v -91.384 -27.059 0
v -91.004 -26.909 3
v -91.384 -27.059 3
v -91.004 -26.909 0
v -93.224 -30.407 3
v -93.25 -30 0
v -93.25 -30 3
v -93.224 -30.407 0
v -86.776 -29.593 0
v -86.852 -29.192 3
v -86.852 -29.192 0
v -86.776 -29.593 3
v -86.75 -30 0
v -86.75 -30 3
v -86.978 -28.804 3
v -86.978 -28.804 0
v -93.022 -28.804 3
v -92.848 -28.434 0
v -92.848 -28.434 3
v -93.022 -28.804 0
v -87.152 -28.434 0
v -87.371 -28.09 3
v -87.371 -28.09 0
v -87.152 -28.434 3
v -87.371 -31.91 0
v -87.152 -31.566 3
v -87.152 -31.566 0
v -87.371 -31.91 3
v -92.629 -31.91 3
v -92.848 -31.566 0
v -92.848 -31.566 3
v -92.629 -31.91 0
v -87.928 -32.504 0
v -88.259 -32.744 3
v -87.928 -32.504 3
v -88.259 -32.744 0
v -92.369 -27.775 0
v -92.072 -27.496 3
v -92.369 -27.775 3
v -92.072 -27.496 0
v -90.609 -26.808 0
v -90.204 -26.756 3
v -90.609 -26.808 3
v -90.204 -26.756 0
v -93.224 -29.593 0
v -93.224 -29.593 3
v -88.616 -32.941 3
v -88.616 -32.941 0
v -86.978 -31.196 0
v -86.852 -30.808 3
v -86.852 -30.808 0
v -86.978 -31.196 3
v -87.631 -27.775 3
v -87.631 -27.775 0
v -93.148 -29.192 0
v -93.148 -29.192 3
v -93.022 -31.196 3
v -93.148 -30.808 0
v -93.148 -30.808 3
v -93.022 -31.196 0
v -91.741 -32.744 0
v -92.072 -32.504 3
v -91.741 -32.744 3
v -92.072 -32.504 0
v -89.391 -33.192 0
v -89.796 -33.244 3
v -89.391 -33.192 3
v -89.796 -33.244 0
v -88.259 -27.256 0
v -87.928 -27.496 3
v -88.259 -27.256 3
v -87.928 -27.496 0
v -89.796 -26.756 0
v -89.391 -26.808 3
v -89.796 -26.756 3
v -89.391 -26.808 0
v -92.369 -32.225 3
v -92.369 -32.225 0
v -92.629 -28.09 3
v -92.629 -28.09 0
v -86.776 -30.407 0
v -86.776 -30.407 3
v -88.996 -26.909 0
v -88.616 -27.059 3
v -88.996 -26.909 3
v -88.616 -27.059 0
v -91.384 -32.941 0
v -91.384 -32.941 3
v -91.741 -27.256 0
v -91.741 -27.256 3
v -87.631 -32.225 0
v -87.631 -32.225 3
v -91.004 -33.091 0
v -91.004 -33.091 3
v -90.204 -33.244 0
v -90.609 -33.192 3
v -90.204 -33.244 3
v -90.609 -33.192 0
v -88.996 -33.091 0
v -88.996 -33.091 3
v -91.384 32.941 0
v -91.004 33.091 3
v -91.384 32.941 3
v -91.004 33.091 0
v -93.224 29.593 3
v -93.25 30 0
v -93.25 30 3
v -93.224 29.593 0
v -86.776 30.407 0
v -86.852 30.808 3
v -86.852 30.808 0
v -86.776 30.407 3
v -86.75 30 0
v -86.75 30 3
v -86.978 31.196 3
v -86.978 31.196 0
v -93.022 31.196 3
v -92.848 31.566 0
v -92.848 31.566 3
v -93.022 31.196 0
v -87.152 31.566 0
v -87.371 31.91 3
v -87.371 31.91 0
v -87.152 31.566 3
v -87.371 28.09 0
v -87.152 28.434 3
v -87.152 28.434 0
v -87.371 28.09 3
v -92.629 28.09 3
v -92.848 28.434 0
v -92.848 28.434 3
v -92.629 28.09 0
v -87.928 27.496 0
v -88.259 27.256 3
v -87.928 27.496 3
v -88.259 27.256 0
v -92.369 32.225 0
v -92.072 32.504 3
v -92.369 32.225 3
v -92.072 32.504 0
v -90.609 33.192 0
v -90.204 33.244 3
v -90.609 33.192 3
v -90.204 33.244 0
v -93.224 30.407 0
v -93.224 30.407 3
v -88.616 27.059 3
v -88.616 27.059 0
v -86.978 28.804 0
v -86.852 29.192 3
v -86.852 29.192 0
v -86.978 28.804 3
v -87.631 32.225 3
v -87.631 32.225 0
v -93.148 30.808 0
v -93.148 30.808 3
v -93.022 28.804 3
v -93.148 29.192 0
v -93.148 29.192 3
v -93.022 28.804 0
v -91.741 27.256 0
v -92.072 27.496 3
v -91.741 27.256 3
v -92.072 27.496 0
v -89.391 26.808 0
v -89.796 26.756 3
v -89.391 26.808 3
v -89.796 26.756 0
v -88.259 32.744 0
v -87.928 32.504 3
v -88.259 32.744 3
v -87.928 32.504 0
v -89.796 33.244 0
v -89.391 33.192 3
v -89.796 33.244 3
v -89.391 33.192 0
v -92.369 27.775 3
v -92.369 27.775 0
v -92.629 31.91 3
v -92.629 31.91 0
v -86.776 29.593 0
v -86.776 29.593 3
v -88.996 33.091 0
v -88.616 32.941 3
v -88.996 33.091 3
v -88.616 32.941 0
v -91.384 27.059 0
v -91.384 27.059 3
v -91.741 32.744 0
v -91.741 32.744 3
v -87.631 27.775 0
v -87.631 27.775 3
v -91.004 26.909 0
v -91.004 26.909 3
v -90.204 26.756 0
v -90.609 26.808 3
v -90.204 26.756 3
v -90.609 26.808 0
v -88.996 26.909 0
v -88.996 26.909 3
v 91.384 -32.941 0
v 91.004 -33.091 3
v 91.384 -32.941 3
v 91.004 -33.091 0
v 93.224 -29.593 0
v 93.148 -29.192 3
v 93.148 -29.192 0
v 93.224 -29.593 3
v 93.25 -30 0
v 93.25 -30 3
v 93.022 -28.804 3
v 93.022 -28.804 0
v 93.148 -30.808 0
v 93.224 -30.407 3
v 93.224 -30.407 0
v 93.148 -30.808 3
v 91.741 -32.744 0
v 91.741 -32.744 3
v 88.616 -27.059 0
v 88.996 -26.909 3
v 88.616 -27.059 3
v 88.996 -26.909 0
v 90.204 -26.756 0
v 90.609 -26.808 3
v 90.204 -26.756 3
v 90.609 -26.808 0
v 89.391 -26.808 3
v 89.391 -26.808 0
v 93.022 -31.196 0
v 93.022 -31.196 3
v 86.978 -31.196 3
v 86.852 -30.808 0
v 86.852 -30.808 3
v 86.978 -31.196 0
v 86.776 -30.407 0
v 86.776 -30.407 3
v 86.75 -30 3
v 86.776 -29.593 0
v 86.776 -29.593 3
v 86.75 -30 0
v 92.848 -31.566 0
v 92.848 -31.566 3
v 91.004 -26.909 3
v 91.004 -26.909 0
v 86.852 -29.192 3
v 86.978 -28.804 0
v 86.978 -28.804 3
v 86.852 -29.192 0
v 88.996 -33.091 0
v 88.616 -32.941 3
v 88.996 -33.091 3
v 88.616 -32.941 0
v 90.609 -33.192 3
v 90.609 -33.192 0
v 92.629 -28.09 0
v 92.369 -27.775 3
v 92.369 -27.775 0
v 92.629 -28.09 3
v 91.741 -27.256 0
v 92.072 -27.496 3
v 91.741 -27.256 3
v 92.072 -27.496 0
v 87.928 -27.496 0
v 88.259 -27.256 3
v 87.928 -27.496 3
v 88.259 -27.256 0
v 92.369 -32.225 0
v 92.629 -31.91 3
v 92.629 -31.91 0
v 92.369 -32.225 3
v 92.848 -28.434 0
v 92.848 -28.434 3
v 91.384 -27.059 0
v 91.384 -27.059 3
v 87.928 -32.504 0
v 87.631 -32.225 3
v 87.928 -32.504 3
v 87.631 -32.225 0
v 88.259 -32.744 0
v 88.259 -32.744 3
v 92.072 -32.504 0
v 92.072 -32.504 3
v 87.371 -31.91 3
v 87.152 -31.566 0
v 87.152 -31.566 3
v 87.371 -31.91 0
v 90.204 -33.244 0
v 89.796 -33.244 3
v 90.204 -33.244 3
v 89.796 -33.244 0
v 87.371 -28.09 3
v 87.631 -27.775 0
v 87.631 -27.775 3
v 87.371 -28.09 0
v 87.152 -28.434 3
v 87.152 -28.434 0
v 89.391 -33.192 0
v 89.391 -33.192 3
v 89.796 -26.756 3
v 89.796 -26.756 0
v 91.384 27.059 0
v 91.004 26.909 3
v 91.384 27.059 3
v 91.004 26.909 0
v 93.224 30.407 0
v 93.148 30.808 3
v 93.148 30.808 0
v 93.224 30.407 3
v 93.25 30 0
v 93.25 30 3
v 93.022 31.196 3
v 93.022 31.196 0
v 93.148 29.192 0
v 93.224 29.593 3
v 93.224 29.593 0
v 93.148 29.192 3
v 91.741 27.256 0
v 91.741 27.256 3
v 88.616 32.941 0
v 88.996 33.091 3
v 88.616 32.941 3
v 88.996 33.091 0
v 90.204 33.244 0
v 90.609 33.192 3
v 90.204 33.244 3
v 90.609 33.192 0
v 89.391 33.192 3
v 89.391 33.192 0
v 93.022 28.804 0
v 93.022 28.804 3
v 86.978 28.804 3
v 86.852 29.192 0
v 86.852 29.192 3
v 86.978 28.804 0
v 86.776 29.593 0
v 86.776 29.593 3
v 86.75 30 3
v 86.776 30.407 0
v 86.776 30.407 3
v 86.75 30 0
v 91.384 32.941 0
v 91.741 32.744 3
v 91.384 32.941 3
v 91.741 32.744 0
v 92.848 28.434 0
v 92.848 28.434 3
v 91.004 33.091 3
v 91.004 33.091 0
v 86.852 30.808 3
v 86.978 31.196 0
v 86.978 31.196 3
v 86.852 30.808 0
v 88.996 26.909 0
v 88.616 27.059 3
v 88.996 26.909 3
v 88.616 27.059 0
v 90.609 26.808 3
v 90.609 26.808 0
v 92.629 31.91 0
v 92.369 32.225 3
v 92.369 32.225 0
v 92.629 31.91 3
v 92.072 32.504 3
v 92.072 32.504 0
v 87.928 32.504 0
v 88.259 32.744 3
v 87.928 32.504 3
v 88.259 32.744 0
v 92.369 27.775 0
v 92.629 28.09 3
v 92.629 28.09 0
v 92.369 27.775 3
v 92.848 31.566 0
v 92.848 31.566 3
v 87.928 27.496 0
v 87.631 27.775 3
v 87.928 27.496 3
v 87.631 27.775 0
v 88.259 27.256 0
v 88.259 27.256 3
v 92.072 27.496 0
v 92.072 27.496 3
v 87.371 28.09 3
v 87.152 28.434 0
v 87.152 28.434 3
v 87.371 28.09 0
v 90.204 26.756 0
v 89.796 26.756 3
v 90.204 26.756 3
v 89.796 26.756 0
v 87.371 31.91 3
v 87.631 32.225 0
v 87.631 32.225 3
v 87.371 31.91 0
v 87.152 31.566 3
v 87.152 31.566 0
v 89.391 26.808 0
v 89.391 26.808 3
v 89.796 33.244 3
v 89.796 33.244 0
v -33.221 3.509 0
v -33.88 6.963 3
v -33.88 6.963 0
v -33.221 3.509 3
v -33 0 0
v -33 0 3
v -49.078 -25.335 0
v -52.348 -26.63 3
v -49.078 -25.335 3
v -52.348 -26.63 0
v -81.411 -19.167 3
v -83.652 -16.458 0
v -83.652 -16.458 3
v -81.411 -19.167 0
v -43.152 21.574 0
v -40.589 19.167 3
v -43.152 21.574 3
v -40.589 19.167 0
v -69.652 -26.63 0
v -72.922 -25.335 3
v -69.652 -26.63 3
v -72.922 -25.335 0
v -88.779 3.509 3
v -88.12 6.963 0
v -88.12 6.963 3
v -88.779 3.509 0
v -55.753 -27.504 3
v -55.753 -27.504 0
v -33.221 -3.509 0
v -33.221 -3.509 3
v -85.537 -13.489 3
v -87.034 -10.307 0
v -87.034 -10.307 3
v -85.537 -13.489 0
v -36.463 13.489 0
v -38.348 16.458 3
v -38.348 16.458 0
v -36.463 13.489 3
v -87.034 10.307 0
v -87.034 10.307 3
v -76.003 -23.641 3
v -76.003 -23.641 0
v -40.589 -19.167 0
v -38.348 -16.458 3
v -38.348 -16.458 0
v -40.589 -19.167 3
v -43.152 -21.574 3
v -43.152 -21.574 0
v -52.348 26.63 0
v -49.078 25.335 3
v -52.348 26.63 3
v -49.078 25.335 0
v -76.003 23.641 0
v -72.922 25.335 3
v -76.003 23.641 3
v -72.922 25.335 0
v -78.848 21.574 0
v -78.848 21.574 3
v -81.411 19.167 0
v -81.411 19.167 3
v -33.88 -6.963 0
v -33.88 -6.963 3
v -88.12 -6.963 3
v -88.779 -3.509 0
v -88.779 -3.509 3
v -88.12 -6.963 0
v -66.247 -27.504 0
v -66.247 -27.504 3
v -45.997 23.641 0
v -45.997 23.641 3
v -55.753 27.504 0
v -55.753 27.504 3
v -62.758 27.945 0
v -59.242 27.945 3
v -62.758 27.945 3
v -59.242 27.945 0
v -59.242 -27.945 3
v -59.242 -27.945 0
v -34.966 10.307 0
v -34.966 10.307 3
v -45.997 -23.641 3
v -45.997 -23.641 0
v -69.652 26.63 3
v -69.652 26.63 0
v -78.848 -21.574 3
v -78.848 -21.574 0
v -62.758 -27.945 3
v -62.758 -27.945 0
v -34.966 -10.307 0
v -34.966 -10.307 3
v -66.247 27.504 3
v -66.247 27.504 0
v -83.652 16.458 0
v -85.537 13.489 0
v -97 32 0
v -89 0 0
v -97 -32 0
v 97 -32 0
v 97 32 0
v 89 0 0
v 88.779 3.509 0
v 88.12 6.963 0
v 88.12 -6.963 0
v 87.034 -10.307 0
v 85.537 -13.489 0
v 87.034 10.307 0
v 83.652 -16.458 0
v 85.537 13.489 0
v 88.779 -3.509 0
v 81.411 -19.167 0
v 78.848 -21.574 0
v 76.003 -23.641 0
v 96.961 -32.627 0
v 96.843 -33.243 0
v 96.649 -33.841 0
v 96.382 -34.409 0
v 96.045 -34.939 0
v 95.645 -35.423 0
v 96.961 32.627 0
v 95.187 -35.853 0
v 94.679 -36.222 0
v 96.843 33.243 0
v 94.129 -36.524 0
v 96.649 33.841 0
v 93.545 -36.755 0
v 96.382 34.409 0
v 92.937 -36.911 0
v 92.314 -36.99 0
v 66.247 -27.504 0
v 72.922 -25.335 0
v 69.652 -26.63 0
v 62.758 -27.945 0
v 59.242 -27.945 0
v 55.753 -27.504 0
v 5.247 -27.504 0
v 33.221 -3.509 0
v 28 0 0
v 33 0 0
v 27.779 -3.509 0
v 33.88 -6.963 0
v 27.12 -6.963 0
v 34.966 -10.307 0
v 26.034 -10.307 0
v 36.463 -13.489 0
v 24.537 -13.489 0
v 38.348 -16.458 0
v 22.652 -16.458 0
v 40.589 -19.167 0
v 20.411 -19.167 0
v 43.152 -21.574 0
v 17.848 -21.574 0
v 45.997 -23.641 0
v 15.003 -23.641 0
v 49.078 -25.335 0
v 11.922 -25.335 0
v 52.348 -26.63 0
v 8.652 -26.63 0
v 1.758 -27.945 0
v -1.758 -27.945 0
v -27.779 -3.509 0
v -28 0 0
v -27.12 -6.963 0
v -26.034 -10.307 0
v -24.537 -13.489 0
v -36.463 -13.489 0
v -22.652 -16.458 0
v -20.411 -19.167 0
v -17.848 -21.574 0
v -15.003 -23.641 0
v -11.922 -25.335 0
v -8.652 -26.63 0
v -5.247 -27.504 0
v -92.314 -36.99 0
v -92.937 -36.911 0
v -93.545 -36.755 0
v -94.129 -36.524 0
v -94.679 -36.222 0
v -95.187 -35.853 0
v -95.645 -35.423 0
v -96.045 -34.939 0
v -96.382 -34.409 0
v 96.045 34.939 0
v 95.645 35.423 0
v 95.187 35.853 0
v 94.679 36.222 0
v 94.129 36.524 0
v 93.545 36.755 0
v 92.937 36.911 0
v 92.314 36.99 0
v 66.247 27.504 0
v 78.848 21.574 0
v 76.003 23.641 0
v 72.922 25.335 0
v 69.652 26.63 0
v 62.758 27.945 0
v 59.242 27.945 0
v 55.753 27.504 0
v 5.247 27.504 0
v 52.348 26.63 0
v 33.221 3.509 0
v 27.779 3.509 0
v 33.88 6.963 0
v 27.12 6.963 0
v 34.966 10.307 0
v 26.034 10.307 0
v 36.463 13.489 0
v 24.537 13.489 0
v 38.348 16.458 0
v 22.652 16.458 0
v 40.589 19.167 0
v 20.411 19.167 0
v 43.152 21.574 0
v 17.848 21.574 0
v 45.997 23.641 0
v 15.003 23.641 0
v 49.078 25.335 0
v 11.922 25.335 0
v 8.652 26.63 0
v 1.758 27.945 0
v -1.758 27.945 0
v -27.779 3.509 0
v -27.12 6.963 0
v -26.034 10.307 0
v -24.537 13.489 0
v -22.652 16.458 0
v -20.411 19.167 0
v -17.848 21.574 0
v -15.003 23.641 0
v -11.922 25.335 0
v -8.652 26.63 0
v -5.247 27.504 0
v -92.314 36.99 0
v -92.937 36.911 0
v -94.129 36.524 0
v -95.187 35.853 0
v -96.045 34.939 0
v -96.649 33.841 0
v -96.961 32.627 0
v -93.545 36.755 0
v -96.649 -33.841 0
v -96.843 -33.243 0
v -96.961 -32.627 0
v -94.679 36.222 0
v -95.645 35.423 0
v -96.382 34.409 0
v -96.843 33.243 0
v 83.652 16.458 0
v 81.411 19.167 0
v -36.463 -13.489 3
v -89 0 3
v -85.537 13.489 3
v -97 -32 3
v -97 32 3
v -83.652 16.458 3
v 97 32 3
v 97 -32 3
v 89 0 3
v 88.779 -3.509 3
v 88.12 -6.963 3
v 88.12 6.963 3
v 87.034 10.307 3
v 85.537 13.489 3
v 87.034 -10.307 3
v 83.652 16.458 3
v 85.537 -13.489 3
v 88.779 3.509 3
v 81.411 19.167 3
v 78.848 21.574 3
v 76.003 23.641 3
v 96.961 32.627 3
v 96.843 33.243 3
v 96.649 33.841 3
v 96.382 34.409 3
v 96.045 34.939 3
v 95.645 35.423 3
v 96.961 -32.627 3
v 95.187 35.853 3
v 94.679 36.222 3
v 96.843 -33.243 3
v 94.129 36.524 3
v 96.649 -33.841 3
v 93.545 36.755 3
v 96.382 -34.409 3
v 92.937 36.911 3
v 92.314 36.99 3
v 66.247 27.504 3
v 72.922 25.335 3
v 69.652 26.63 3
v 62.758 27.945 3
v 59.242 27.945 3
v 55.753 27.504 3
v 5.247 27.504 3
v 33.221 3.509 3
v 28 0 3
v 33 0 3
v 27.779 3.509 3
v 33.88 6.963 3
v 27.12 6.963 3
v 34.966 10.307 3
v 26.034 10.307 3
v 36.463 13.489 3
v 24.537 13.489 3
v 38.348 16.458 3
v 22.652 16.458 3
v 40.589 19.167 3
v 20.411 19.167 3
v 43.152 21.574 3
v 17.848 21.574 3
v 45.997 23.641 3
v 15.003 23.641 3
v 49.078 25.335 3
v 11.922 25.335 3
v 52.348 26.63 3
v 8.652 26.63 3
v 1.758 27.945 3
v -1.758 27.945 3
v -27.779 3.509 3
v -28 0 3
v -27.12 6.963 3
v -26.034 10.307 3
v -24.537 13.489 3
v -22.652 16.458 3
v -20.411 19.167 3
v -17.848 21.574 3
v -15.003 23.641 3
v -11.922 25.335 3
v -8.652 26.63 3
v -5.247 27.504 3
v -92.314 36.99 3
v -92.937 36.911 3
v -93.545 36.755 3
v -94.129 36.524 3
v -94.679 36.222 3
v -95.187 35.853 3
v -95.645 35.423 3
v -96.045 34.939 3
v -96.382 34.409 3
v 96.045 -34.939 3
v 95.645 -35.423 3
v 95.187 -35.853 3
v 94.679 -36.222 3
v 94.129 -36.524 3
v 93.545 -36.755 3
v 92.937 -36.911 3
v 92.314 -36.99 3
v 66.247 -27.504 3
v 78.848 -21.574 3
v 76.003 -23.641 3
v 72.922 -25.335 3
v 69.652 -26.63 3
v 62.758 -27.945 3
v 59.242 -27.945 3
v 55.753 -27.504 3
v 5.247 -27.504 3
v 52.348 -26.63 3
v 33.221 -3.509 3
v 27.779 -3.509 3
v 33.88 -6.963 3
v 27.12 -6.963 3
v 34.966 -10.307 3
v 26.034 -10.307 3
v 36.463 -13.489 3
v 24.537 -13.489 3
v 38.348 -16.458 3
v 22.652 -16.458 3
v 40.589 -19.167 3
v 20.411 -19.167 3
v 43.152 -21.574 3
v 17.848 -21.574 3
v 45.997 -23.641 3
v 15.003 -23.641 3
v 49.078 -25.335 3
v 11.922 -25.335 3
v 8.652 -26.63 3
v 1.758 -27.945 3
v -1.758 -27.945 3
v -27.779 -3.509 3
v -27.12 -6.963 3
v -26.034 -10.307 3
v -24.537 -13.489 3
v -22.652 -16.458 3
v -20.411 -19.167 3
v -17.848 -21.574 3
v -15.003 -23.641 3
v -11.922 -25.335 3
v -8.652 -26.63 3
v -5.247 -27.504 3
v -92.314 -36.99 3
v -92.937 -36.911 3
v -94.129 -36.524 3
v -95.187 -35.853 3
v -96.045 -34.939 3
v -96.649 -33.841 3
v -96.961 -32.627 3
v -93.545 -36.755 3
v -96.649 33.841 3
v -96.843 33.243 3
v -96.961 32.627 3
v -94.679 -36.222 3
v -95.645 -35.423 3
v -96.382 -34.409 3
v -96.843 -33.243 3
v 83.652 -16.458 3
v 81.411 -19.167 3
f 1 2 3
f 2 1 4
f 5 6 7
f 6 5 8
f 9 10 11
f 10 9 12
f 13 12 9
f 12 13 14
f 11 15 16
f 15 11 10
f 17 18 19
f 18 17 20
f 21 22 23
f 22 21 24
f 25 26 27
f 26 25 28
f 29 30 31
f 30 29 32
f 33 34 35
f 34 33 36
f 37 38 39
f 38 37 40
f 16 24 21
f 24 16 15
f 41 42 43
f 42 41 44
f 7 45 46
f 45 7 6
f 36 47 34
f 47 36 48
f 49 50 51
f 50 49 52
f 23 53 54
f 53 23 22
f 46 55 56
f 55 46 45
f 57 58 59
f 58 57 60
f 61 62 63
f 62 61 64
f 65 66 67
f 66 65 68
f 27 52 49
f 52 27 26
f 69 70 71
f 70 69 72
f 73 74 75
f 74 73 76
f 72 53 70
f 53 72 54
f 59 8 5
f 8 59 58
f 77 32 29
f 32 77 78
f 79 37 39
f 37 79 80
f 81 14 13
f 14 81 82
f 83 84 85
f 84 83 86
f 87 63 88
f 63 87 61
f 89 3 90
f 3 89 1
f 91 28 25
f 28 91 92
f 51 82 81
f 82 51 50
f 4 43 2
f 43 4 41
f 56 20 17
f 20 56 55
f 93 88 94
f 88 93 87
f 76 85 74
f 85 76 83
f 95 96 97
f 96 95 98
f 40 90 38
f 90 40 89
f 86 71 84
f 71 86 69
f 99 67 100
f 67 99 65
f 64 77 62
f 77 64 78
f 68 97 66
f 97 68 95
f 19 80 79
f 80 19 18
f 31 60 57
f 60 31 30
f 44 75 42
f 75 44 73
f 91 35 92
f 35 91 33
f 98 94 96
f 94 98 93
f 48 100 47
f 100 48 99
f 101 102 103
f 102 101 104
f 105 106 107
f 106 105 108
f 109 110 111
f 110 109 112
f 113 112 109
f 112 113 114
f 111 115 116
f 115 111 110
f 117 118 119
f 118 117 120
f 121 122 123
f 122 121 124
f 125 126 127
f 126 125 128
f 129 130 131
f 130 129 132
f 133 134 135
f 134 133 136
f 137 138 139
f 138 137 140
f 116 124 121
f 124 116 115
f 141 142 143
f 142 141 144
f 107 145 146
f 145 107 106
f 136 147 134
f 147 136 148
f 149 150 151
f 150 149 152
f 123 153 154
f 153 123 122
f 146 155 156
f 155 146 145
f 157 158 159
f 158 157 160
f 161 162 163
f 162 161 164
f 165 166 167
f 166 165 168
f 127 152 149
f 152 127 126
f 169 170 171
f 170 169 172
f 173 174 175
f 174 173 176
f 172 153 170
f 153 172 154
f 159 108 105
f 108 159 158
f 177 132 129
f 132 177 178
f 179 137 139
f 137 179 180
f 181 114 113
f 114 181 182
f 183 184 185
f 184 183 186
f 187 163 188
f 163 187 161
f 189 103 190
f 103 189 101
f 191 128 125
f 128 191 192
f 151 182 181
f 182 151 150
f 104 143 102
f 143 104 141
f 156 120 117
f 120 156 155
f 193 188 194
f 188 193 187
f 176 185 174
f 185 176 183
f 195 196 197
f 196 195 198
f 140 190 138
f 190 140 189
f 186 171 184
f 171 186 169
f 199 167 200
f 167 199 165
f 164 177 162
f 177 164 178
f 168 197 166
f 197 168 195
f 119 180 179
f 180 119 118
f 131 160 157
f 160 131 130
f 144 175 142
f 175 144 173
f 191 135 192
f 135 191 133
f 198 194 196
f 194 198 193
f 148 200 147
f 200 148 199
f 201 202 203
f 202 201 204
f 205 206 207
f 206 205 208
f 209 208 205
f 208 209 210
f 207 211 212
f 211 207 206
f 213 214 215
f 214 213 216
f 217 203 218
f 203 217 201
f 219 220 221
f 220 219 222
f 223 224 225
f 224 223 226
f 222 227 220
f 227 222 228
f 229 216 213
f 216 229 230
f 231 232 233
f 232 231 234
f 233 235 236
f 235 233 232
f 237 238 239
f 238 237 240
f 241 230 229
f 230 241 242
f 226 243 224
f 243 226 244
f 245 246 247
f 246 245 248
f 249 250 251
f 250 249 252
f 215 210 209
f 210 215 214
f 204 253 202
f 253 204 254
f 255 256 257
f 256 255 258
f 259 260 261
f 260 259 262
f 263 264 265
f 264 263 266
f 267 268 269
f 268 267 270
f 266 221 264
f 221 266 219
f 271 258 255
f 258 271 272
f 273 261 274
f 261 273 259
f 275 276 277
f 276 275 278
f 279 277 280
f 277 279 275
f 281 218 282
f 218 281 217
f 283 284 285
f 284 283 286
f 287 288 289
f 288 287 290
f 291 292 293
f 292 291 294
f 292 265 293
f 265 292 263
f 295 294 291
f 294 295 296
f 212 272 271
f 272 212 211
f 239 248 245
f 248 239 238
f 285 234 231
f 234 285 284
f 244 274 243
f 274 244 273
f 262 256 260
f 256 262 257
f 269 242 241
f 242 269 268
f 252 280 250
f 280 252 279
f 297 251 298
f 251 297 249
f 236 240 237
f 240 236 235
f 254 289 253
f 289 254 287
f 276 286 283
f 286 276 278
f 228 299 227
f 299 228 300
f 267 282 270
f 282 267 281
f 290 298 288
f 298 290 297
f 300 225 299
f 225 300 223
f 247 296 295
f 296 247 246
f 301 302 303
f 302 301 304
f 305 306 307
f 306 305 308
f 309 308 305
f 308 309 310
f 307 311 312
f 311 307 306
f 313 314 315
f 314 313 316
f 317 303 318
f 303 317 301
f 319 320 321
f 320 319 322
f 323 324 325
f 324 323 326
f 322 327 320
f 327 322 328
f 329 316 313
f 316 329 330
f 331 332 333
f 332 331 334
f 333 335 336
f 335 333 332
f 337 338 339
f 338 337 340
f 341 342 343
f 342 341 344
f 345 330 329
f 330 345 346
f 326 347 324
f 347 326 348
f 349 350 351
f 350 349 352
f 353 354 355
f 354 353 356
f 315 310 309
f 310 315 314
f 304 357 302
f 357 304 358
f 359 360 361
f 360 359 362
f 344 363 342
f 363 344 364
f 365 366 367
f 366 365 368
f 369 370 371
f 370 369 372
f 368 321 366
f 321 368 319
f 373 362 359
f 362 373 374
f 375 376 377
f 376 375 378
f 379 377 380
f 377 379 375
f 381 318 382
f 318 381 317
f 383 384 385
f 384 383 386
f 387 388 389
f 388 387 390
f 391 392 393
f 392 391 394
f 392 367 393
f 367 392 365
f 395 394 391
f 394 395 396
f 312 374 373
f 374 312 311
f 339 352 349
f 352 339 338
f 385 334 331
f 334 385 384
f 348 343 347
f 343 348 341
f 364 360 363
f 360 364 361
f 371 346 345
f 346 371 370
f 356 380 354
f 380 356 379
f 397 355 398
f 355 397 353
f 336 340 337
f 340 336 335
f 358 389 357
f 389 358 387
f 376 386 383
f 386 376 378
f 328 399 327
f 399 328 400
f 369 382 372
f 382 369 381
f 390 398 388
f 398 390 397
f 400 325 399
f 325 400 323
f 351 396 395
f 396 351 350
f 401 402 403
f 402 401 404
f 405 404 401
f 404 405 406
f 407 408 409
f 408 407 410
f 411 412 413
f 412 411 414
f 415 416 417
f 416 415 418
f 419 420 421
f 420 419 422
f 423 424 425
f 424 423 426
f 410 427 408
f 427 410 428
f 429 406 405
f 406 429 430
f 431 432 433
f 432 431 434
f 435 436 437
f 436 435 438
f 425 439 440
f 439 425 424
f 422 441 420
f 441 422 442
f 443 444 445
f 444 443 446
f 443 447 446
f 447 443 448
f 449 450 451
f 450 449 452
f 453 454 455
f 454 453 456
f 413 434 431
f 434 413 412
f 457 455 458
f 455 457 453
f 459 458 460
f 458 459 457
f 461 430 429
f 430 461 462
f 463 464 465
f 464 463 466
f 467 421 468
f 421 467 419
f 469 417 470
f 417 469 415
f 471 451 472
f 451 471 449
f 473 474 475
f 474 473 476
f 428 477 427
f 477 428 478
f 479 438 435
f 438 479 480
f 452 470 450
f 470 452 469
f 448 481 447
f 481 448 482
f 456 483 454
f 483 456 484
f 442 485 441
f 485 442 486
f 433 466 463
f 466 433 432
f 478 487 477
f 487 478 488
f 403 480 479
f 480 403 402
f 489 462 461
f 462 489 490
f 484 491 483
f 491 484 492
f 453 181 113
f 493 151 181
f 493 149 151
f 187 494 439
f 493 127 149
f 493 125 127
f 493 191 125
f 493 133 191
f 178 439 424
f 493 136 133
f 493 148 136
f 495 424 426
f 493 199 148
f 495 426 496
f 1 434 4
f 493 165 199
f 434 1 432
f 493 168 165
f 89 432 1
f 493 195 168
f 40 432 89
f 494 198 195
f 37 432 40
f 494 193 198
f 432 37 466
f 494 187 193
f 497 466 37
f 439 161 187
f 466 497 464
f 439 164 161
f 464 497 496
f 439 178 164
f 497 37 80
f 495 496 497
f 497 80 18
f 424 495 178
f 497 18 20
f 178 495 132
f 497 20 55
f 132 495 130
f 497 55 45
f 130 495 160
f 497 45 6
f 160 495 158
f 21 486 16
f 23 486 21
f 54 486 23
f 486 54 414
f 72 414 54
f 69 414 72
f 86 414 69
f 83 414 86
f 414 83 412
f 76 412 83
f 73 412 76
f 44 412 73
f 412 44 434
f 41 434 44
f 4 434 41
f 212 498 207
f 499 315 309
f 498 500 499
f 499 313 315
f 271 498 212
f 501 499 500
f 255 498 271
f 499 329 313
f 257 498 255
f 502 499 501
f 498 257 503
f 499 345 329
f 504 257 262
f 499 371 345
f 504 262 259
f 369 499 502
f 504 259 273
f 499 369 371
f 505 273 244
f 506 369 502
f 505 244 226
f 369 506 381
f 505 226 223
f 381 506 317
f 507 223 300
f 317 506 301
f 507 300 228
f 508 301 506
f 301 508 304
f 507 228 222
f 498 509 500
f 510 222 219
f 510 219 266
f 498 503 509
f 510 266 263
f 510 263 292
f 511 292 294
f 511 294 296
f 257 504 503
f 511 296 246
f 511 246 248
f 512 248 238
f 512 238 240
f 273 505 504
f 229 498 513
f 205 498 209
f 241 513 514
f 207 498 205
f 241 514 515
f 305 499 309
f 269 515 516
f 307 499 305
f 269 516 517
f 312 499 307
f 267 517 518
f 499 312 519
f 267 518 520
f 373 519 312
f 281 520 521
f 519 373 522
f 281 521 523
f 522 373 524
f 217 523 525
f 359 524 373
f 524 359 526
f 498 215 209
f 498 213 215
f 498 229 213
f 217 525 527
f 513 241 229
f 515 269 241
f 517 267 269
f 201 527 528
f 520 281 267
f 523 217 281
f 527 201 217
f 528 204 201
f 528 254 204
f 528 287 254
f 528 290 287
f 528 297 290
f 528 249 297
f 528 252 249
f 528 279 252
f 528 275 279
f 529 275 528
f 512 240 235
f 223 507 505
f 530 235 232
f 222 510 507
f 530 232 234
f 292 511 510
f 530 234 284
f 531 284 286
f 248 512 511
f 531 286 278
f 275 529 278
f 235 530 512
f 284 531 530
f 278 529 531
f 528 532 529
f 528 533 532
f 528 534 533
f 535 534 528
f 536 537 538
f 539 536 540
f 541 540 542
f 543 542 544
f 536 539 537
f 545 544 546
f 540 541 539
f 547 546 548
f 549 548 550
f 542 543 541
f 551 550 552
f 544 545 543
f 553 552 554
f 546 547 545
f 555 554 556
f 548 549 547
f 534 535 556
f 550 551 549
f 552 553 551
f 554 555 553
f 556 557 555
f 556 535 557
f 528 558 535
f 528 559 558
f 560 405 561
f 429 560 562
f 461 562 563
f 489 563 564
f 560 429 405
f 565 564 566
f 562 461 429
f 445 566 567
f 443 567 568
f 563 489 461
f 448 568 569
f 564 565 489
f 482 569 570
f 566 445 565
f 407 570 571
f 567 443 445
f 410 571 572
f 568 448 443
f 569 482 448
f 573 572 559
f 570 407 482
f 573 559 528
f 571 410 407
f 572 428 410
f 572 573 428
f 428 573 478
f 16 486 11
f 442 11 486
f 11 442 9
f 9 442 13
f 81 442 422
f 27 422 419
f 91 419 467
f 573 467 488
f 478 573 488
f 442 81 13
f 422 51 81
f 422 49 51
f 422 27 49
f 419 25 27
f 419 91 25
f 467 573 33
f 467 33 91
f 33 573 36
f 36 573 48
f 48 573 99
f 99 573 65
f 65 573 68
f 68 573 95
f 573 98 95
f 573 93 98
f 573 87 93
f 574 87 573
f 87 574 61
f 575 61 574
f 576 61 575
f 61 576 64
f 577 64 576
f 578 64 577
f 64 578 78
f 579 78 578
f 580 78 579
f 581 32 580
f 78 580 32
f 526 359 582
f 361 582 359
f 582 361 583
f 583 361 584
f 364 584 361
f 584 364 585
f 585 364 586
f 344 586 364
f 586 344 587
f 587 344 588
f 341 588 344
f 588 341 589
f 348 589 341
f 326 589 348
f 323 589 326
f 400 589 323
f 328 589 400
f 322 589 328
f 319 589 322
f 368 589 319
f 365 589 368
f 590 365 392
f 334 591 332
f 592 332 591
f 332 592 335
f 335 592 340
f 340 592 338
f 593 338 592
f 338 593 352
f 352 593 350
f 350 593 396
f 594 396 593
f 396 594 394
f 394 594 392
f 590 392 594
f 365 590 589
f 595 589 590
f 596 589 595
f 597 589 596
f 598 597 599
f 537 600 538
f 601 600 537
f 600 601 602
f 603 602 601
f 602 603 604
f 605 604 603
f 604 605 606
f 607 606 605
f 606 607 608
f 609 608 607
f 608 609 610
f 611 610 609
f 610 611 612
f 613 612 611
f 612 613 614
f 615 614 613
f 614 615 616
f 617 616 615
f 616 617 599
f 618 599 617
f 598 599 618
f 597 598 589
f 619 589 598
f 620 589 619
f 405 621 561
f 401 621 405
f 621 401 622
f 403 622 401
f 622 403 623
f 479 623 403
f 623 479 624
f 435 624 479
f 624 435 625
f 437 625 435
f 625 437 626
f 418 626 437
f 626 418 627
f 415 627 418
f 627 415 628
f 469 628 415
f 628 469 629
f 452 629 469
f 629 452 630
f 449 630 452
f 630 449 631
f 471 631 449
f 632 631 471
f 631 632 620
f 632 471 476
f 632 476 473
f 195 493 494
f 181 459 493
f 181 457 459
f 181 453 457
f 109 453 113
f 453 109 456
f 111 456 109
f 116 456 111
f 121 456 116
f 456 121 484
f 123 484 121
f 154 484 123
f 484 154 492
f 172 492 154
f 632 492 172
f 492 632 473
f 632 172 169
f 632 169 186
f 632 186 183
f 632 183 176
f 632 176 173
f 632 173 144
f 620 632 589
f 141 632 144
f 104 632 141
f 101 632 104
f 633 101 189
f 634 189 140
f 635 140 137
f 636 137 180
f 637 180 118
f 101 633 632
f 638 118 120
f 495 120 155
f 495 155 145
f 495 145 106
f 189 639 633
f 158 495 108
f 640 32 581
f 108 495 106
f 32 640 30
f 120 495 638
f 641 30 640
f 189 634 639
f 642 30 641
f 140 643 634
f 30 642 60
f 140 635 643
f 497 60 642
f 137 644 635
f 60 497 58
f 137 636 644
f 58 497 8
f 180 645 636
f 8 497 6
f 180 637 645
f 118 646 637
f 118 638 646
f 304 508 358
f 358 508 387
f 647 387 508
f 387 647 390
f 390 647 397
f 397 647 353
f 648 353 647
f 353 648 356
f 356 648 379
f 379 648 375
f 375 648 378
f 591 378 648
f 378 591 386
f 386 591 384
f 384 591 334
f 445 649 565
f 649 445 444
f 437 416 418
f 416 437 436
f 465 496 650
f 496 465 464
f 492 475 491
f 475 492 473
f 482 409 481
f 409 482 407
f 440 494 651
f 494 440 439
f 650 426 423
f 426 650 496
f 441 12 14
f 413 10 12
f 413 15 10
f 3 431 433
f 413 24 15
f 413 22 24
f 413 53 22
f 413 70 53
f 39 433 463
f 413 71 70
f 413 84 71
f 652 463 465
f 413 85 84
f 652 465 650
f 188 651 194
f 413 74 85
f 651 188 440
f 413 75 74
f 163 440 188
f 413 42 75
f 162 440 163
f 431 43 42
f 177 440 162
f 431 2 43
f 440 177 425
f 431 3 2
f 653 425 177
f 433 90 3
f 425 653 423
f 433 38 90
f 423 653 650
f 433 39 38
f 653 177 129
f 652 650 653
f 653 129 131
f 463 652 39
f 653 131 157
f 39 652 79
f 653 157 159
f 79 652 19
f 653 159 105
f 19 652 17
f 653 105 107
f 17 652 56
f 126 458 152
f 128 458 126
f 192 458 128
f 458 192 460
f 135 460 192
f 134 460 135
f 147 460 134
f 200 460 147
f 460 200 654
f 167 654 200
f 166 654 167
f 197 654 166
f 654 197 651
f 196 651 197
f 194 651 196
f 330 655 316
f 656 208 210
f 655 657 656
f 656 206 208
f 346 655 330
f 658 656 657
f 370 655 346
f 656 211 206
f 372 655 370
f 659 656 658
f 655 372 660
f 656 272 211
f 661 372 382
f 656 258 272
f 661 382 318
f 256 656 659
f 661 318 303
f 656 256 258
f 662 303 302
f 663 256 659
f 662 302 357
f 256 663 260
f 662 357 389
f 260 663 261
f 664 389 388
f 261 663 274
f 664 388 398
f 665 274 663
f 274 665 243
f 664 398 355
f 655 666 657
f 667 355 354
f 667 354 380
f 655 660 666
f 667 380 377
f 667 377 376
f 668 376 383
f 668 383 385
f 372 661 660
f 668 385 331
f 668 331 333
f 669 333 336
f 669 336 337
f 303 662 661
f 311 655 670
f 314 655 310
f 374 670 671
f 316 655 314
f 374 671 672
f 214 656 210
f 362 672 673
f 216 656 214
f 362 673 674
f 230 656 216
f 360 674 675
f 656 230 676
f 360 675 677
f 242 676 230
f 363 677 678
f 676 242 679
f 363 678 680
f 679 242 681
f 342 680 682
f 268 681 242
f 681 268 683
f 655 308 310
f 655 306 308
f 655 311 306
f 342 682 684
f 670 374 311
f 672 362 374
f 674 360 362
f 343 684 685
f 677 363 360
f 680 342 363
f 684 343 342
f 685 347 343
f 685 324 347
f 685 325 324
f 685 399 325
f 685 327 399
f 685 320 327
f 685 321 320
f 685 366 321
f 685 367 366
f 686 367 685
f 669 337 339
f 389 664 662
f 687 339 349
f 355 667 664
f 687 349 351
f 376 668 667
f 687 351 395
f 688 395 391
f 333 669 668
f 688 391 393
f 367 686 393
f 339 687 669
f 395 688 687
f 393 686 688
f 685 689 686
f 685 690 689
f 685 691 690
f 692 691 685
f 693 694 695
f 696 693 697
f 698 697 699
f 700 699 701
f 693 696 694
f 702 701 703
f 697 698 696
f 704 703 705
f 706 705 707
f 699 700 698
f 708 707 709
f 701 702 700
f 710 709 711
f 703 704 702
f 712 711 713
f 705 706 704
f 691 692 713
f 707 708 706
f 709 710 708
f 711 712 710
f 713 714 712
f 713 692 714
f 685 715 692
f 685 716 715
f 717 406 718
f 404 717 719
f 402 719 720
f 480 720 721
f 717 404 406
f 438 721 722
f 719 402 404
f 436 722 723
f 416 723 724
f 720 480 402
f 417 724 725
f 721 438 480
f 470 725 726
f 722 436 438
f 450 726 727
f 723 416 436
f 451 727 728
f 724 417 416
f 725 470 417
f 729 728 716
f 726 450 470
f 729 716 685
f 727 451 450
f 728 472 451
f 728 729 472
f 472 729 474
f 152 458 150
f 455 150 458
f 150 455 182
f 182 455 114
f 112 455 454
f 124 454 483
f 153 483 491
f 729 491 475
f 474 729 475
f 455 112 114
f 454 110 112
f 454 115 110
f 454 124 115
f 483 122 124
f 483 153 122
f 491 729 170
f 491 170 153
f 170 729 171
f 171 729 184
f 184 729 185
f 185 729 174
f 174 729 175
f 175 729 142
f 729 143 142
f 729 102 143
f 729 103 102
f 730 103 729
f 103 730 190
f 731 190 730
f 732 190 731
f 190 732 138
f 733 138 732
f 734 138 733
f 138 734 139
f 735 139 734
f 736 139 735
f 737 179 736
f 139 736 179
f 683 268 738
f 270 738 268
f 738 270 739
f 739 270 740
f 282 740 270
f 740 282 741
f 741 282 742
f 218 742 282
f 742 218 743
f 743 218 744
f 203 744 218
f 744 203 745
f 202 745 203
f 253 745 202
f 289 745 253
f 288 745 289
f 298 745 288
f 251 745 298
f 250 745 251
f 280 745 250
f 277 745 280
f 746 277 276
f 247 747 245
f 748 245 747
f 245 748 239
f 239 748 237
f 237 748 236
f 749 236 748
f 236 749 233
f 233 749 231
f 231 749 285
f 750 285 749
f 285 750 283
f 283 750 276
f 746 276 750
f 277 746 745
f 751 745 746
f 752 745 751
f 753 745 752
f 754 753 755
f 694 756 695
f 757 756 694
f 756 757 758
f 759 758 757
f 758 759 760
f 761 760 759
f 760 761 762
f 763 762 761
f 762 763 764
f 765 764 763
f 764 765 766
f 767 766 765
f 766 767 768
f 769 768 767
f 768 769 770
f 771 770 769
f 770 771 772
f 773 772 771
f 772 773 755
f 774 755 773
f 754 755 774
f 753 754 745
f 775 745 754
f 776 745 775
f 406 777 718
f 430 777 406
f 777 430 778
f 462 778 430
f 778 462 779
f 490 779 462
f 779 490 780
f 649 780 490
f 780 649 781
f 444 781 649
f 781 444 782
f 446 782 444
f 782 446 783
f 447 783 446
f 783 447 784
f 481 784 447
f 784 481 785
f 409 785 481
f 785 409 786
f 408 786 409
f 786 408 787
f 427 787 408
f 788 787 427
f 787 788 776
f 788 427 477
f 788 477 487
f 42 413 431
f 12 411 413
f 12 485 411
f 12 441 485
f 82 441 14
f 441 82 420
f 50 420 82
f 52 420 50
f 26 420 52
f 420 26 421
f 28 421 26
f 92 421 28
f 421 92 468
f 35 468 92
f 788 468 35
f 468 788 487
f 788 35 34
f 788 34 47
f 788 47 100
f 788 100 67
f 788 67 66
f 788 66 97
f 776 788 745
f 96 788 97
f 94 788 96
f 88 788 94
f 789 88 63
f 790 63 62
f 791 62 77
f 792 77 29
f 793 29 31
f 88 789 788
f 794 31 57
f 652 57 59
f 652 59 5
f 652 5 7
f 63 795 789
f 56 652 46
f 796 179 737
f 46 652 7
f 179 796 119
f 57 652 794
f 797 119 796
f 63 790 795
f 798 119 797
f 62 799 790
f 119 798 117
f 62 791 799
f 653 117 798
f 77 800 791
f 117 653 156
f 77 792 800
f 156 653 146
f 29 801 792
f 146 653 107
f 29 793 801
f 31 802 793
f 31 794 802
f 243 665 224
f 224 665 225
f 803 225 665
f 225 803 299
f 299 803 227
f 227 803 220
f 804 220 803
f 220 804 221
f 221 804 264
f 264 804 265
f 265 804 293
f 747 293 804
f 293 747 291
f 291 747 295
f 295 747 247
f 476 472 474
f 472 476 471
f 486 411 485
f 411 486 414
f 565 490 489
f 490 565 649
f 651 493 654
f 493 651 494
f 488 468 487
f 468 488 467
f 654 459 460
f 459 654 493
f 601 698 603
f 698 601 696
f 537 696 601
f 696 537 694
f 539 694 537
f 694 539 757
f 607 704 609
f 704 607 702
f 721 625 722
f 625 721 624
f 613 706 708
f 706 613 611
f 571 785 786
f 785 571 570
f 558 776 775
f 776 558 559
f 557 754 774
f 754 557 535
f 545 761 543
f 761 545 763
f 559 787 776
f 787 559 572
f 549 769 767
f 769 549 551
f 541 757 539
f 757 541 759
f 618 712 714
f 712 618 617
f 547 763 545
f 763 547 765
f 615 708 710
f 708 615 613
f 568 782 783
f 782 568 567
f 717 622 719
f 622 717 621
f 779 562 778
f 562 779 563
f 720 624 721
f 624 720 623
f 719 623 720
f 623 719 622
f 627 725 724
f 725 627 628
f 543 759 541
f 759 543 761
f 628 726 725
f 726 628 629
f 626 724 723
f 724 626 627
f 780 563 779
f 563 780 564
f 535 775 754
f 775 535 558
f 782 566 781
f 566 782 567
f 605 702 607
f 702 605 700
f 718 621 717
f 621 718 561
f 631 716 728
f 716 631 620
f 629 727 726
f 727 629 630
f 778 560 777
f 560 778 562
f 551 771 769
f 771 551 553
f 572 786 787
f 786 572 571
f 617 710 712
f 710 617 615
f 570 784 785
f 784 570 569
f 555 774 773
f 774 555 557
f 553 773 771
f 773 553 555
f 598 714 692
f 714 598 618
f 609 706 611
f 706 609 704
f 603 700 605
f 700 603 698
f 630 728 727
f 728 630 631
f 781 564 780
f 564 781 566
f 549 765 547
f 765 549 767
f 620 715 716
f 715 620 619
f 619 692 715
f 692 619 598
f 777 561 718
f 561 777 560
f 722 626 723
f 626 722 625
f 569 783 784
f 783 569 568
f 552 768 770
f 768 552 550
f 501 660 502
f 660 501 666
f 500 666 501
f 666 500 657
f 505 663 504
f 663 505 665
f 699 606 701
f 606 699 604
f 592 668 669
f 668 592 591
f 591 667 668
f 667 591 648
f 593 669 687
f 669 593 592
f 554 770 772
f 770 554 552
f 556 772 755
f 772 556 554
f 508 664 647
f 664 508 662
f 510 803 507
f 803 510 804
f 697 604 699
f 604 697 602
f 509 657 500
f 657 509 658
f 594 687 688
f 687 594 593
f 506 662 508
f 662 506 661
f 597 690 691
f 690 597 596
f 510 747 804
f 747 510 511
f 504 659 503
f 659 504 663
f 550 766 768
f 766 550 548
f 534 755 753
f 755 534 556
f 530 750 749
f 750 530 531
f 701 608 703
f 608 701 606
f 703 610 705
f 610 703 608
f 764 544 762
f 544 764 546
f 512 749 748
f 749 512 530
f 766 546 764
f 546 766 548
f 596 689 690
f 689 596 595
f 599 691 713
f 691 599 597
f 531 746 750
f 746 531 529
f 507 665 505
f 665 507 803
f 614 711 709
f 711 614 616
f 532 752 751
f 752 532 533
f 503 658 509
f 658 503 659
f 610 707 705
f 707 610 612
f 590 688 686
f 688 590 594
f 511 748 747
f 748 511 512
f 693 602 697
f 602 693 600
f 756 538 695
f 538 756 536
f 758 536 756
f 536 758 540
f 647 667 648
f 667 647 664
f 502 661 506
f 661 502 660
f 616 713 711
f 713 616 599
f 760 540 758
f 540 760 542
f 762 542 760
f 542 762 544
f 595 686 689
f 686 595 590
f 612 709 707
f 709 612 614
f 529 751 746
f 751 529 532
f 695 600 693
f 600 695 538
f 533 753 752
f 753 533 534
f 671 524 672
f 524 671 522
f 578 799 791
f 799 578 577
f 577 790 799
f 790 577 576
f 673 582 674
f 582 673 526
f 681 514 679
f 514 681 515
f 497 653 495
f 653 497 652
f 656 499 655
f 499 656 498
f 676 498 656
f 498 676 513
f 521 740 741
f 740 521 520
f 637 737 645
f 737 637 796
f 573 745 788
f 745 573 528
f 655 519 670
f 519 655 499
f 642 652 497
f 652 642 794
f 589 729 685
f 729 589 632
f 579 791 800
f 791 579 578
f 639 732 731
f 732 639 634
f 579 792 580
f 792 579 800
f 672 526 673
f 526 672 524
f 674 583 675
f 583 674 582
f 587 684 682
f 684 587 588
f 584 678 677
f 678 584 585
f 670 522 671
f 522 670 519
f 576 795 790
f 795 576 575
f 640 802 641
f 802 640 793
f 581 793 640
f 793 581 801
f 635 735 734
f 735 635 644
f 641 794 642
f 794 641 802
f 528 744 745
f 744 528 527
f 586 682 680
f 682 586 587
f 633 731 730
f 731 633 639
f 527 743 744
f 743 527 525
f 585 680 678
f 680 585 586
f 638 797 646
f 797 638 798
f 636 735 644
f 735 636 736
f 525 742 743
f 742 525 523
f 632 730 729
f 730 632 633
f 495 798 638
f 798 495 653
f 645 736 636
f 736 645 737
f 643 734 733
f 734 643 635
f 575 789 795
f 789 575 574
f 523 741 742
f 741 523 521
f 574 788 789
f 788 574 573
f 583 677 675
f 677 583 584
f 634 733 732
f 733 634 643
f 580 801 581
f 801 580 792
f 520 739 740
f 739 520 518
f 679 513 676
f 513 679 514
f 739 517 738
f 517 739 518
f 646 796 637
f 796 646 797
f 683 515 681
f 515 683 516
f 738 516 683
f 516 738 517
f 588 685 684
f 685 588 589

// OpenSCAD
$fn = 50;


difference() {
	union() {
		hull() {
			translate(v = [-92.0000000000, 32.0000000000, 0]) {
				cylinder(h = 3, r = 5);
			}
			translate(v = [92.0000000000, 32.0000000000, 0]) {
				cylinder(h = 3, r = 5);
			}
			translate(v = [-92.0000000000, -32.0000000000, 0]) {
				cylinder(h = 3, r = 5);
			}
			translate(v = [92.0000000000, -32.0000000000, 0]) {
				cylinder(h = 3, r = 5);
			}
		}
	}
	union() {
		#translate(v = [-90.0000000000, -30.0000000000, -100.0000000000]) {
			cylinder(h = 200, r = 3.2500000000);
		}
		#translate(v = [-90.0000000000, 30.0000000000, -100.0000000000]) {
			cylinder(h = 200, r = 3.2500000000);
		}
		#translate(v = [90.0000000000, -30.0000000000, -100.0000000000]) {
			cylinder(h = 200, r = 3.2500000000);
		}
		#translate(v = [90.0000000000, 30.0000000000, -100.0000000000]) {
			cylinder(h = 200, r = 3.2500000000);
		}
		#translate(v = [-61.0000000000, 0, 0]) {
			cylinder(h = 3, r = 28.0000000000);
		}
		#cylinder(h = 3, r = 28.0000000000);
		#translate(v = [61.0000000000, 0, 0]) {
			cylinder(h = 3, r = 28.0000000000);
		}
	}
}
